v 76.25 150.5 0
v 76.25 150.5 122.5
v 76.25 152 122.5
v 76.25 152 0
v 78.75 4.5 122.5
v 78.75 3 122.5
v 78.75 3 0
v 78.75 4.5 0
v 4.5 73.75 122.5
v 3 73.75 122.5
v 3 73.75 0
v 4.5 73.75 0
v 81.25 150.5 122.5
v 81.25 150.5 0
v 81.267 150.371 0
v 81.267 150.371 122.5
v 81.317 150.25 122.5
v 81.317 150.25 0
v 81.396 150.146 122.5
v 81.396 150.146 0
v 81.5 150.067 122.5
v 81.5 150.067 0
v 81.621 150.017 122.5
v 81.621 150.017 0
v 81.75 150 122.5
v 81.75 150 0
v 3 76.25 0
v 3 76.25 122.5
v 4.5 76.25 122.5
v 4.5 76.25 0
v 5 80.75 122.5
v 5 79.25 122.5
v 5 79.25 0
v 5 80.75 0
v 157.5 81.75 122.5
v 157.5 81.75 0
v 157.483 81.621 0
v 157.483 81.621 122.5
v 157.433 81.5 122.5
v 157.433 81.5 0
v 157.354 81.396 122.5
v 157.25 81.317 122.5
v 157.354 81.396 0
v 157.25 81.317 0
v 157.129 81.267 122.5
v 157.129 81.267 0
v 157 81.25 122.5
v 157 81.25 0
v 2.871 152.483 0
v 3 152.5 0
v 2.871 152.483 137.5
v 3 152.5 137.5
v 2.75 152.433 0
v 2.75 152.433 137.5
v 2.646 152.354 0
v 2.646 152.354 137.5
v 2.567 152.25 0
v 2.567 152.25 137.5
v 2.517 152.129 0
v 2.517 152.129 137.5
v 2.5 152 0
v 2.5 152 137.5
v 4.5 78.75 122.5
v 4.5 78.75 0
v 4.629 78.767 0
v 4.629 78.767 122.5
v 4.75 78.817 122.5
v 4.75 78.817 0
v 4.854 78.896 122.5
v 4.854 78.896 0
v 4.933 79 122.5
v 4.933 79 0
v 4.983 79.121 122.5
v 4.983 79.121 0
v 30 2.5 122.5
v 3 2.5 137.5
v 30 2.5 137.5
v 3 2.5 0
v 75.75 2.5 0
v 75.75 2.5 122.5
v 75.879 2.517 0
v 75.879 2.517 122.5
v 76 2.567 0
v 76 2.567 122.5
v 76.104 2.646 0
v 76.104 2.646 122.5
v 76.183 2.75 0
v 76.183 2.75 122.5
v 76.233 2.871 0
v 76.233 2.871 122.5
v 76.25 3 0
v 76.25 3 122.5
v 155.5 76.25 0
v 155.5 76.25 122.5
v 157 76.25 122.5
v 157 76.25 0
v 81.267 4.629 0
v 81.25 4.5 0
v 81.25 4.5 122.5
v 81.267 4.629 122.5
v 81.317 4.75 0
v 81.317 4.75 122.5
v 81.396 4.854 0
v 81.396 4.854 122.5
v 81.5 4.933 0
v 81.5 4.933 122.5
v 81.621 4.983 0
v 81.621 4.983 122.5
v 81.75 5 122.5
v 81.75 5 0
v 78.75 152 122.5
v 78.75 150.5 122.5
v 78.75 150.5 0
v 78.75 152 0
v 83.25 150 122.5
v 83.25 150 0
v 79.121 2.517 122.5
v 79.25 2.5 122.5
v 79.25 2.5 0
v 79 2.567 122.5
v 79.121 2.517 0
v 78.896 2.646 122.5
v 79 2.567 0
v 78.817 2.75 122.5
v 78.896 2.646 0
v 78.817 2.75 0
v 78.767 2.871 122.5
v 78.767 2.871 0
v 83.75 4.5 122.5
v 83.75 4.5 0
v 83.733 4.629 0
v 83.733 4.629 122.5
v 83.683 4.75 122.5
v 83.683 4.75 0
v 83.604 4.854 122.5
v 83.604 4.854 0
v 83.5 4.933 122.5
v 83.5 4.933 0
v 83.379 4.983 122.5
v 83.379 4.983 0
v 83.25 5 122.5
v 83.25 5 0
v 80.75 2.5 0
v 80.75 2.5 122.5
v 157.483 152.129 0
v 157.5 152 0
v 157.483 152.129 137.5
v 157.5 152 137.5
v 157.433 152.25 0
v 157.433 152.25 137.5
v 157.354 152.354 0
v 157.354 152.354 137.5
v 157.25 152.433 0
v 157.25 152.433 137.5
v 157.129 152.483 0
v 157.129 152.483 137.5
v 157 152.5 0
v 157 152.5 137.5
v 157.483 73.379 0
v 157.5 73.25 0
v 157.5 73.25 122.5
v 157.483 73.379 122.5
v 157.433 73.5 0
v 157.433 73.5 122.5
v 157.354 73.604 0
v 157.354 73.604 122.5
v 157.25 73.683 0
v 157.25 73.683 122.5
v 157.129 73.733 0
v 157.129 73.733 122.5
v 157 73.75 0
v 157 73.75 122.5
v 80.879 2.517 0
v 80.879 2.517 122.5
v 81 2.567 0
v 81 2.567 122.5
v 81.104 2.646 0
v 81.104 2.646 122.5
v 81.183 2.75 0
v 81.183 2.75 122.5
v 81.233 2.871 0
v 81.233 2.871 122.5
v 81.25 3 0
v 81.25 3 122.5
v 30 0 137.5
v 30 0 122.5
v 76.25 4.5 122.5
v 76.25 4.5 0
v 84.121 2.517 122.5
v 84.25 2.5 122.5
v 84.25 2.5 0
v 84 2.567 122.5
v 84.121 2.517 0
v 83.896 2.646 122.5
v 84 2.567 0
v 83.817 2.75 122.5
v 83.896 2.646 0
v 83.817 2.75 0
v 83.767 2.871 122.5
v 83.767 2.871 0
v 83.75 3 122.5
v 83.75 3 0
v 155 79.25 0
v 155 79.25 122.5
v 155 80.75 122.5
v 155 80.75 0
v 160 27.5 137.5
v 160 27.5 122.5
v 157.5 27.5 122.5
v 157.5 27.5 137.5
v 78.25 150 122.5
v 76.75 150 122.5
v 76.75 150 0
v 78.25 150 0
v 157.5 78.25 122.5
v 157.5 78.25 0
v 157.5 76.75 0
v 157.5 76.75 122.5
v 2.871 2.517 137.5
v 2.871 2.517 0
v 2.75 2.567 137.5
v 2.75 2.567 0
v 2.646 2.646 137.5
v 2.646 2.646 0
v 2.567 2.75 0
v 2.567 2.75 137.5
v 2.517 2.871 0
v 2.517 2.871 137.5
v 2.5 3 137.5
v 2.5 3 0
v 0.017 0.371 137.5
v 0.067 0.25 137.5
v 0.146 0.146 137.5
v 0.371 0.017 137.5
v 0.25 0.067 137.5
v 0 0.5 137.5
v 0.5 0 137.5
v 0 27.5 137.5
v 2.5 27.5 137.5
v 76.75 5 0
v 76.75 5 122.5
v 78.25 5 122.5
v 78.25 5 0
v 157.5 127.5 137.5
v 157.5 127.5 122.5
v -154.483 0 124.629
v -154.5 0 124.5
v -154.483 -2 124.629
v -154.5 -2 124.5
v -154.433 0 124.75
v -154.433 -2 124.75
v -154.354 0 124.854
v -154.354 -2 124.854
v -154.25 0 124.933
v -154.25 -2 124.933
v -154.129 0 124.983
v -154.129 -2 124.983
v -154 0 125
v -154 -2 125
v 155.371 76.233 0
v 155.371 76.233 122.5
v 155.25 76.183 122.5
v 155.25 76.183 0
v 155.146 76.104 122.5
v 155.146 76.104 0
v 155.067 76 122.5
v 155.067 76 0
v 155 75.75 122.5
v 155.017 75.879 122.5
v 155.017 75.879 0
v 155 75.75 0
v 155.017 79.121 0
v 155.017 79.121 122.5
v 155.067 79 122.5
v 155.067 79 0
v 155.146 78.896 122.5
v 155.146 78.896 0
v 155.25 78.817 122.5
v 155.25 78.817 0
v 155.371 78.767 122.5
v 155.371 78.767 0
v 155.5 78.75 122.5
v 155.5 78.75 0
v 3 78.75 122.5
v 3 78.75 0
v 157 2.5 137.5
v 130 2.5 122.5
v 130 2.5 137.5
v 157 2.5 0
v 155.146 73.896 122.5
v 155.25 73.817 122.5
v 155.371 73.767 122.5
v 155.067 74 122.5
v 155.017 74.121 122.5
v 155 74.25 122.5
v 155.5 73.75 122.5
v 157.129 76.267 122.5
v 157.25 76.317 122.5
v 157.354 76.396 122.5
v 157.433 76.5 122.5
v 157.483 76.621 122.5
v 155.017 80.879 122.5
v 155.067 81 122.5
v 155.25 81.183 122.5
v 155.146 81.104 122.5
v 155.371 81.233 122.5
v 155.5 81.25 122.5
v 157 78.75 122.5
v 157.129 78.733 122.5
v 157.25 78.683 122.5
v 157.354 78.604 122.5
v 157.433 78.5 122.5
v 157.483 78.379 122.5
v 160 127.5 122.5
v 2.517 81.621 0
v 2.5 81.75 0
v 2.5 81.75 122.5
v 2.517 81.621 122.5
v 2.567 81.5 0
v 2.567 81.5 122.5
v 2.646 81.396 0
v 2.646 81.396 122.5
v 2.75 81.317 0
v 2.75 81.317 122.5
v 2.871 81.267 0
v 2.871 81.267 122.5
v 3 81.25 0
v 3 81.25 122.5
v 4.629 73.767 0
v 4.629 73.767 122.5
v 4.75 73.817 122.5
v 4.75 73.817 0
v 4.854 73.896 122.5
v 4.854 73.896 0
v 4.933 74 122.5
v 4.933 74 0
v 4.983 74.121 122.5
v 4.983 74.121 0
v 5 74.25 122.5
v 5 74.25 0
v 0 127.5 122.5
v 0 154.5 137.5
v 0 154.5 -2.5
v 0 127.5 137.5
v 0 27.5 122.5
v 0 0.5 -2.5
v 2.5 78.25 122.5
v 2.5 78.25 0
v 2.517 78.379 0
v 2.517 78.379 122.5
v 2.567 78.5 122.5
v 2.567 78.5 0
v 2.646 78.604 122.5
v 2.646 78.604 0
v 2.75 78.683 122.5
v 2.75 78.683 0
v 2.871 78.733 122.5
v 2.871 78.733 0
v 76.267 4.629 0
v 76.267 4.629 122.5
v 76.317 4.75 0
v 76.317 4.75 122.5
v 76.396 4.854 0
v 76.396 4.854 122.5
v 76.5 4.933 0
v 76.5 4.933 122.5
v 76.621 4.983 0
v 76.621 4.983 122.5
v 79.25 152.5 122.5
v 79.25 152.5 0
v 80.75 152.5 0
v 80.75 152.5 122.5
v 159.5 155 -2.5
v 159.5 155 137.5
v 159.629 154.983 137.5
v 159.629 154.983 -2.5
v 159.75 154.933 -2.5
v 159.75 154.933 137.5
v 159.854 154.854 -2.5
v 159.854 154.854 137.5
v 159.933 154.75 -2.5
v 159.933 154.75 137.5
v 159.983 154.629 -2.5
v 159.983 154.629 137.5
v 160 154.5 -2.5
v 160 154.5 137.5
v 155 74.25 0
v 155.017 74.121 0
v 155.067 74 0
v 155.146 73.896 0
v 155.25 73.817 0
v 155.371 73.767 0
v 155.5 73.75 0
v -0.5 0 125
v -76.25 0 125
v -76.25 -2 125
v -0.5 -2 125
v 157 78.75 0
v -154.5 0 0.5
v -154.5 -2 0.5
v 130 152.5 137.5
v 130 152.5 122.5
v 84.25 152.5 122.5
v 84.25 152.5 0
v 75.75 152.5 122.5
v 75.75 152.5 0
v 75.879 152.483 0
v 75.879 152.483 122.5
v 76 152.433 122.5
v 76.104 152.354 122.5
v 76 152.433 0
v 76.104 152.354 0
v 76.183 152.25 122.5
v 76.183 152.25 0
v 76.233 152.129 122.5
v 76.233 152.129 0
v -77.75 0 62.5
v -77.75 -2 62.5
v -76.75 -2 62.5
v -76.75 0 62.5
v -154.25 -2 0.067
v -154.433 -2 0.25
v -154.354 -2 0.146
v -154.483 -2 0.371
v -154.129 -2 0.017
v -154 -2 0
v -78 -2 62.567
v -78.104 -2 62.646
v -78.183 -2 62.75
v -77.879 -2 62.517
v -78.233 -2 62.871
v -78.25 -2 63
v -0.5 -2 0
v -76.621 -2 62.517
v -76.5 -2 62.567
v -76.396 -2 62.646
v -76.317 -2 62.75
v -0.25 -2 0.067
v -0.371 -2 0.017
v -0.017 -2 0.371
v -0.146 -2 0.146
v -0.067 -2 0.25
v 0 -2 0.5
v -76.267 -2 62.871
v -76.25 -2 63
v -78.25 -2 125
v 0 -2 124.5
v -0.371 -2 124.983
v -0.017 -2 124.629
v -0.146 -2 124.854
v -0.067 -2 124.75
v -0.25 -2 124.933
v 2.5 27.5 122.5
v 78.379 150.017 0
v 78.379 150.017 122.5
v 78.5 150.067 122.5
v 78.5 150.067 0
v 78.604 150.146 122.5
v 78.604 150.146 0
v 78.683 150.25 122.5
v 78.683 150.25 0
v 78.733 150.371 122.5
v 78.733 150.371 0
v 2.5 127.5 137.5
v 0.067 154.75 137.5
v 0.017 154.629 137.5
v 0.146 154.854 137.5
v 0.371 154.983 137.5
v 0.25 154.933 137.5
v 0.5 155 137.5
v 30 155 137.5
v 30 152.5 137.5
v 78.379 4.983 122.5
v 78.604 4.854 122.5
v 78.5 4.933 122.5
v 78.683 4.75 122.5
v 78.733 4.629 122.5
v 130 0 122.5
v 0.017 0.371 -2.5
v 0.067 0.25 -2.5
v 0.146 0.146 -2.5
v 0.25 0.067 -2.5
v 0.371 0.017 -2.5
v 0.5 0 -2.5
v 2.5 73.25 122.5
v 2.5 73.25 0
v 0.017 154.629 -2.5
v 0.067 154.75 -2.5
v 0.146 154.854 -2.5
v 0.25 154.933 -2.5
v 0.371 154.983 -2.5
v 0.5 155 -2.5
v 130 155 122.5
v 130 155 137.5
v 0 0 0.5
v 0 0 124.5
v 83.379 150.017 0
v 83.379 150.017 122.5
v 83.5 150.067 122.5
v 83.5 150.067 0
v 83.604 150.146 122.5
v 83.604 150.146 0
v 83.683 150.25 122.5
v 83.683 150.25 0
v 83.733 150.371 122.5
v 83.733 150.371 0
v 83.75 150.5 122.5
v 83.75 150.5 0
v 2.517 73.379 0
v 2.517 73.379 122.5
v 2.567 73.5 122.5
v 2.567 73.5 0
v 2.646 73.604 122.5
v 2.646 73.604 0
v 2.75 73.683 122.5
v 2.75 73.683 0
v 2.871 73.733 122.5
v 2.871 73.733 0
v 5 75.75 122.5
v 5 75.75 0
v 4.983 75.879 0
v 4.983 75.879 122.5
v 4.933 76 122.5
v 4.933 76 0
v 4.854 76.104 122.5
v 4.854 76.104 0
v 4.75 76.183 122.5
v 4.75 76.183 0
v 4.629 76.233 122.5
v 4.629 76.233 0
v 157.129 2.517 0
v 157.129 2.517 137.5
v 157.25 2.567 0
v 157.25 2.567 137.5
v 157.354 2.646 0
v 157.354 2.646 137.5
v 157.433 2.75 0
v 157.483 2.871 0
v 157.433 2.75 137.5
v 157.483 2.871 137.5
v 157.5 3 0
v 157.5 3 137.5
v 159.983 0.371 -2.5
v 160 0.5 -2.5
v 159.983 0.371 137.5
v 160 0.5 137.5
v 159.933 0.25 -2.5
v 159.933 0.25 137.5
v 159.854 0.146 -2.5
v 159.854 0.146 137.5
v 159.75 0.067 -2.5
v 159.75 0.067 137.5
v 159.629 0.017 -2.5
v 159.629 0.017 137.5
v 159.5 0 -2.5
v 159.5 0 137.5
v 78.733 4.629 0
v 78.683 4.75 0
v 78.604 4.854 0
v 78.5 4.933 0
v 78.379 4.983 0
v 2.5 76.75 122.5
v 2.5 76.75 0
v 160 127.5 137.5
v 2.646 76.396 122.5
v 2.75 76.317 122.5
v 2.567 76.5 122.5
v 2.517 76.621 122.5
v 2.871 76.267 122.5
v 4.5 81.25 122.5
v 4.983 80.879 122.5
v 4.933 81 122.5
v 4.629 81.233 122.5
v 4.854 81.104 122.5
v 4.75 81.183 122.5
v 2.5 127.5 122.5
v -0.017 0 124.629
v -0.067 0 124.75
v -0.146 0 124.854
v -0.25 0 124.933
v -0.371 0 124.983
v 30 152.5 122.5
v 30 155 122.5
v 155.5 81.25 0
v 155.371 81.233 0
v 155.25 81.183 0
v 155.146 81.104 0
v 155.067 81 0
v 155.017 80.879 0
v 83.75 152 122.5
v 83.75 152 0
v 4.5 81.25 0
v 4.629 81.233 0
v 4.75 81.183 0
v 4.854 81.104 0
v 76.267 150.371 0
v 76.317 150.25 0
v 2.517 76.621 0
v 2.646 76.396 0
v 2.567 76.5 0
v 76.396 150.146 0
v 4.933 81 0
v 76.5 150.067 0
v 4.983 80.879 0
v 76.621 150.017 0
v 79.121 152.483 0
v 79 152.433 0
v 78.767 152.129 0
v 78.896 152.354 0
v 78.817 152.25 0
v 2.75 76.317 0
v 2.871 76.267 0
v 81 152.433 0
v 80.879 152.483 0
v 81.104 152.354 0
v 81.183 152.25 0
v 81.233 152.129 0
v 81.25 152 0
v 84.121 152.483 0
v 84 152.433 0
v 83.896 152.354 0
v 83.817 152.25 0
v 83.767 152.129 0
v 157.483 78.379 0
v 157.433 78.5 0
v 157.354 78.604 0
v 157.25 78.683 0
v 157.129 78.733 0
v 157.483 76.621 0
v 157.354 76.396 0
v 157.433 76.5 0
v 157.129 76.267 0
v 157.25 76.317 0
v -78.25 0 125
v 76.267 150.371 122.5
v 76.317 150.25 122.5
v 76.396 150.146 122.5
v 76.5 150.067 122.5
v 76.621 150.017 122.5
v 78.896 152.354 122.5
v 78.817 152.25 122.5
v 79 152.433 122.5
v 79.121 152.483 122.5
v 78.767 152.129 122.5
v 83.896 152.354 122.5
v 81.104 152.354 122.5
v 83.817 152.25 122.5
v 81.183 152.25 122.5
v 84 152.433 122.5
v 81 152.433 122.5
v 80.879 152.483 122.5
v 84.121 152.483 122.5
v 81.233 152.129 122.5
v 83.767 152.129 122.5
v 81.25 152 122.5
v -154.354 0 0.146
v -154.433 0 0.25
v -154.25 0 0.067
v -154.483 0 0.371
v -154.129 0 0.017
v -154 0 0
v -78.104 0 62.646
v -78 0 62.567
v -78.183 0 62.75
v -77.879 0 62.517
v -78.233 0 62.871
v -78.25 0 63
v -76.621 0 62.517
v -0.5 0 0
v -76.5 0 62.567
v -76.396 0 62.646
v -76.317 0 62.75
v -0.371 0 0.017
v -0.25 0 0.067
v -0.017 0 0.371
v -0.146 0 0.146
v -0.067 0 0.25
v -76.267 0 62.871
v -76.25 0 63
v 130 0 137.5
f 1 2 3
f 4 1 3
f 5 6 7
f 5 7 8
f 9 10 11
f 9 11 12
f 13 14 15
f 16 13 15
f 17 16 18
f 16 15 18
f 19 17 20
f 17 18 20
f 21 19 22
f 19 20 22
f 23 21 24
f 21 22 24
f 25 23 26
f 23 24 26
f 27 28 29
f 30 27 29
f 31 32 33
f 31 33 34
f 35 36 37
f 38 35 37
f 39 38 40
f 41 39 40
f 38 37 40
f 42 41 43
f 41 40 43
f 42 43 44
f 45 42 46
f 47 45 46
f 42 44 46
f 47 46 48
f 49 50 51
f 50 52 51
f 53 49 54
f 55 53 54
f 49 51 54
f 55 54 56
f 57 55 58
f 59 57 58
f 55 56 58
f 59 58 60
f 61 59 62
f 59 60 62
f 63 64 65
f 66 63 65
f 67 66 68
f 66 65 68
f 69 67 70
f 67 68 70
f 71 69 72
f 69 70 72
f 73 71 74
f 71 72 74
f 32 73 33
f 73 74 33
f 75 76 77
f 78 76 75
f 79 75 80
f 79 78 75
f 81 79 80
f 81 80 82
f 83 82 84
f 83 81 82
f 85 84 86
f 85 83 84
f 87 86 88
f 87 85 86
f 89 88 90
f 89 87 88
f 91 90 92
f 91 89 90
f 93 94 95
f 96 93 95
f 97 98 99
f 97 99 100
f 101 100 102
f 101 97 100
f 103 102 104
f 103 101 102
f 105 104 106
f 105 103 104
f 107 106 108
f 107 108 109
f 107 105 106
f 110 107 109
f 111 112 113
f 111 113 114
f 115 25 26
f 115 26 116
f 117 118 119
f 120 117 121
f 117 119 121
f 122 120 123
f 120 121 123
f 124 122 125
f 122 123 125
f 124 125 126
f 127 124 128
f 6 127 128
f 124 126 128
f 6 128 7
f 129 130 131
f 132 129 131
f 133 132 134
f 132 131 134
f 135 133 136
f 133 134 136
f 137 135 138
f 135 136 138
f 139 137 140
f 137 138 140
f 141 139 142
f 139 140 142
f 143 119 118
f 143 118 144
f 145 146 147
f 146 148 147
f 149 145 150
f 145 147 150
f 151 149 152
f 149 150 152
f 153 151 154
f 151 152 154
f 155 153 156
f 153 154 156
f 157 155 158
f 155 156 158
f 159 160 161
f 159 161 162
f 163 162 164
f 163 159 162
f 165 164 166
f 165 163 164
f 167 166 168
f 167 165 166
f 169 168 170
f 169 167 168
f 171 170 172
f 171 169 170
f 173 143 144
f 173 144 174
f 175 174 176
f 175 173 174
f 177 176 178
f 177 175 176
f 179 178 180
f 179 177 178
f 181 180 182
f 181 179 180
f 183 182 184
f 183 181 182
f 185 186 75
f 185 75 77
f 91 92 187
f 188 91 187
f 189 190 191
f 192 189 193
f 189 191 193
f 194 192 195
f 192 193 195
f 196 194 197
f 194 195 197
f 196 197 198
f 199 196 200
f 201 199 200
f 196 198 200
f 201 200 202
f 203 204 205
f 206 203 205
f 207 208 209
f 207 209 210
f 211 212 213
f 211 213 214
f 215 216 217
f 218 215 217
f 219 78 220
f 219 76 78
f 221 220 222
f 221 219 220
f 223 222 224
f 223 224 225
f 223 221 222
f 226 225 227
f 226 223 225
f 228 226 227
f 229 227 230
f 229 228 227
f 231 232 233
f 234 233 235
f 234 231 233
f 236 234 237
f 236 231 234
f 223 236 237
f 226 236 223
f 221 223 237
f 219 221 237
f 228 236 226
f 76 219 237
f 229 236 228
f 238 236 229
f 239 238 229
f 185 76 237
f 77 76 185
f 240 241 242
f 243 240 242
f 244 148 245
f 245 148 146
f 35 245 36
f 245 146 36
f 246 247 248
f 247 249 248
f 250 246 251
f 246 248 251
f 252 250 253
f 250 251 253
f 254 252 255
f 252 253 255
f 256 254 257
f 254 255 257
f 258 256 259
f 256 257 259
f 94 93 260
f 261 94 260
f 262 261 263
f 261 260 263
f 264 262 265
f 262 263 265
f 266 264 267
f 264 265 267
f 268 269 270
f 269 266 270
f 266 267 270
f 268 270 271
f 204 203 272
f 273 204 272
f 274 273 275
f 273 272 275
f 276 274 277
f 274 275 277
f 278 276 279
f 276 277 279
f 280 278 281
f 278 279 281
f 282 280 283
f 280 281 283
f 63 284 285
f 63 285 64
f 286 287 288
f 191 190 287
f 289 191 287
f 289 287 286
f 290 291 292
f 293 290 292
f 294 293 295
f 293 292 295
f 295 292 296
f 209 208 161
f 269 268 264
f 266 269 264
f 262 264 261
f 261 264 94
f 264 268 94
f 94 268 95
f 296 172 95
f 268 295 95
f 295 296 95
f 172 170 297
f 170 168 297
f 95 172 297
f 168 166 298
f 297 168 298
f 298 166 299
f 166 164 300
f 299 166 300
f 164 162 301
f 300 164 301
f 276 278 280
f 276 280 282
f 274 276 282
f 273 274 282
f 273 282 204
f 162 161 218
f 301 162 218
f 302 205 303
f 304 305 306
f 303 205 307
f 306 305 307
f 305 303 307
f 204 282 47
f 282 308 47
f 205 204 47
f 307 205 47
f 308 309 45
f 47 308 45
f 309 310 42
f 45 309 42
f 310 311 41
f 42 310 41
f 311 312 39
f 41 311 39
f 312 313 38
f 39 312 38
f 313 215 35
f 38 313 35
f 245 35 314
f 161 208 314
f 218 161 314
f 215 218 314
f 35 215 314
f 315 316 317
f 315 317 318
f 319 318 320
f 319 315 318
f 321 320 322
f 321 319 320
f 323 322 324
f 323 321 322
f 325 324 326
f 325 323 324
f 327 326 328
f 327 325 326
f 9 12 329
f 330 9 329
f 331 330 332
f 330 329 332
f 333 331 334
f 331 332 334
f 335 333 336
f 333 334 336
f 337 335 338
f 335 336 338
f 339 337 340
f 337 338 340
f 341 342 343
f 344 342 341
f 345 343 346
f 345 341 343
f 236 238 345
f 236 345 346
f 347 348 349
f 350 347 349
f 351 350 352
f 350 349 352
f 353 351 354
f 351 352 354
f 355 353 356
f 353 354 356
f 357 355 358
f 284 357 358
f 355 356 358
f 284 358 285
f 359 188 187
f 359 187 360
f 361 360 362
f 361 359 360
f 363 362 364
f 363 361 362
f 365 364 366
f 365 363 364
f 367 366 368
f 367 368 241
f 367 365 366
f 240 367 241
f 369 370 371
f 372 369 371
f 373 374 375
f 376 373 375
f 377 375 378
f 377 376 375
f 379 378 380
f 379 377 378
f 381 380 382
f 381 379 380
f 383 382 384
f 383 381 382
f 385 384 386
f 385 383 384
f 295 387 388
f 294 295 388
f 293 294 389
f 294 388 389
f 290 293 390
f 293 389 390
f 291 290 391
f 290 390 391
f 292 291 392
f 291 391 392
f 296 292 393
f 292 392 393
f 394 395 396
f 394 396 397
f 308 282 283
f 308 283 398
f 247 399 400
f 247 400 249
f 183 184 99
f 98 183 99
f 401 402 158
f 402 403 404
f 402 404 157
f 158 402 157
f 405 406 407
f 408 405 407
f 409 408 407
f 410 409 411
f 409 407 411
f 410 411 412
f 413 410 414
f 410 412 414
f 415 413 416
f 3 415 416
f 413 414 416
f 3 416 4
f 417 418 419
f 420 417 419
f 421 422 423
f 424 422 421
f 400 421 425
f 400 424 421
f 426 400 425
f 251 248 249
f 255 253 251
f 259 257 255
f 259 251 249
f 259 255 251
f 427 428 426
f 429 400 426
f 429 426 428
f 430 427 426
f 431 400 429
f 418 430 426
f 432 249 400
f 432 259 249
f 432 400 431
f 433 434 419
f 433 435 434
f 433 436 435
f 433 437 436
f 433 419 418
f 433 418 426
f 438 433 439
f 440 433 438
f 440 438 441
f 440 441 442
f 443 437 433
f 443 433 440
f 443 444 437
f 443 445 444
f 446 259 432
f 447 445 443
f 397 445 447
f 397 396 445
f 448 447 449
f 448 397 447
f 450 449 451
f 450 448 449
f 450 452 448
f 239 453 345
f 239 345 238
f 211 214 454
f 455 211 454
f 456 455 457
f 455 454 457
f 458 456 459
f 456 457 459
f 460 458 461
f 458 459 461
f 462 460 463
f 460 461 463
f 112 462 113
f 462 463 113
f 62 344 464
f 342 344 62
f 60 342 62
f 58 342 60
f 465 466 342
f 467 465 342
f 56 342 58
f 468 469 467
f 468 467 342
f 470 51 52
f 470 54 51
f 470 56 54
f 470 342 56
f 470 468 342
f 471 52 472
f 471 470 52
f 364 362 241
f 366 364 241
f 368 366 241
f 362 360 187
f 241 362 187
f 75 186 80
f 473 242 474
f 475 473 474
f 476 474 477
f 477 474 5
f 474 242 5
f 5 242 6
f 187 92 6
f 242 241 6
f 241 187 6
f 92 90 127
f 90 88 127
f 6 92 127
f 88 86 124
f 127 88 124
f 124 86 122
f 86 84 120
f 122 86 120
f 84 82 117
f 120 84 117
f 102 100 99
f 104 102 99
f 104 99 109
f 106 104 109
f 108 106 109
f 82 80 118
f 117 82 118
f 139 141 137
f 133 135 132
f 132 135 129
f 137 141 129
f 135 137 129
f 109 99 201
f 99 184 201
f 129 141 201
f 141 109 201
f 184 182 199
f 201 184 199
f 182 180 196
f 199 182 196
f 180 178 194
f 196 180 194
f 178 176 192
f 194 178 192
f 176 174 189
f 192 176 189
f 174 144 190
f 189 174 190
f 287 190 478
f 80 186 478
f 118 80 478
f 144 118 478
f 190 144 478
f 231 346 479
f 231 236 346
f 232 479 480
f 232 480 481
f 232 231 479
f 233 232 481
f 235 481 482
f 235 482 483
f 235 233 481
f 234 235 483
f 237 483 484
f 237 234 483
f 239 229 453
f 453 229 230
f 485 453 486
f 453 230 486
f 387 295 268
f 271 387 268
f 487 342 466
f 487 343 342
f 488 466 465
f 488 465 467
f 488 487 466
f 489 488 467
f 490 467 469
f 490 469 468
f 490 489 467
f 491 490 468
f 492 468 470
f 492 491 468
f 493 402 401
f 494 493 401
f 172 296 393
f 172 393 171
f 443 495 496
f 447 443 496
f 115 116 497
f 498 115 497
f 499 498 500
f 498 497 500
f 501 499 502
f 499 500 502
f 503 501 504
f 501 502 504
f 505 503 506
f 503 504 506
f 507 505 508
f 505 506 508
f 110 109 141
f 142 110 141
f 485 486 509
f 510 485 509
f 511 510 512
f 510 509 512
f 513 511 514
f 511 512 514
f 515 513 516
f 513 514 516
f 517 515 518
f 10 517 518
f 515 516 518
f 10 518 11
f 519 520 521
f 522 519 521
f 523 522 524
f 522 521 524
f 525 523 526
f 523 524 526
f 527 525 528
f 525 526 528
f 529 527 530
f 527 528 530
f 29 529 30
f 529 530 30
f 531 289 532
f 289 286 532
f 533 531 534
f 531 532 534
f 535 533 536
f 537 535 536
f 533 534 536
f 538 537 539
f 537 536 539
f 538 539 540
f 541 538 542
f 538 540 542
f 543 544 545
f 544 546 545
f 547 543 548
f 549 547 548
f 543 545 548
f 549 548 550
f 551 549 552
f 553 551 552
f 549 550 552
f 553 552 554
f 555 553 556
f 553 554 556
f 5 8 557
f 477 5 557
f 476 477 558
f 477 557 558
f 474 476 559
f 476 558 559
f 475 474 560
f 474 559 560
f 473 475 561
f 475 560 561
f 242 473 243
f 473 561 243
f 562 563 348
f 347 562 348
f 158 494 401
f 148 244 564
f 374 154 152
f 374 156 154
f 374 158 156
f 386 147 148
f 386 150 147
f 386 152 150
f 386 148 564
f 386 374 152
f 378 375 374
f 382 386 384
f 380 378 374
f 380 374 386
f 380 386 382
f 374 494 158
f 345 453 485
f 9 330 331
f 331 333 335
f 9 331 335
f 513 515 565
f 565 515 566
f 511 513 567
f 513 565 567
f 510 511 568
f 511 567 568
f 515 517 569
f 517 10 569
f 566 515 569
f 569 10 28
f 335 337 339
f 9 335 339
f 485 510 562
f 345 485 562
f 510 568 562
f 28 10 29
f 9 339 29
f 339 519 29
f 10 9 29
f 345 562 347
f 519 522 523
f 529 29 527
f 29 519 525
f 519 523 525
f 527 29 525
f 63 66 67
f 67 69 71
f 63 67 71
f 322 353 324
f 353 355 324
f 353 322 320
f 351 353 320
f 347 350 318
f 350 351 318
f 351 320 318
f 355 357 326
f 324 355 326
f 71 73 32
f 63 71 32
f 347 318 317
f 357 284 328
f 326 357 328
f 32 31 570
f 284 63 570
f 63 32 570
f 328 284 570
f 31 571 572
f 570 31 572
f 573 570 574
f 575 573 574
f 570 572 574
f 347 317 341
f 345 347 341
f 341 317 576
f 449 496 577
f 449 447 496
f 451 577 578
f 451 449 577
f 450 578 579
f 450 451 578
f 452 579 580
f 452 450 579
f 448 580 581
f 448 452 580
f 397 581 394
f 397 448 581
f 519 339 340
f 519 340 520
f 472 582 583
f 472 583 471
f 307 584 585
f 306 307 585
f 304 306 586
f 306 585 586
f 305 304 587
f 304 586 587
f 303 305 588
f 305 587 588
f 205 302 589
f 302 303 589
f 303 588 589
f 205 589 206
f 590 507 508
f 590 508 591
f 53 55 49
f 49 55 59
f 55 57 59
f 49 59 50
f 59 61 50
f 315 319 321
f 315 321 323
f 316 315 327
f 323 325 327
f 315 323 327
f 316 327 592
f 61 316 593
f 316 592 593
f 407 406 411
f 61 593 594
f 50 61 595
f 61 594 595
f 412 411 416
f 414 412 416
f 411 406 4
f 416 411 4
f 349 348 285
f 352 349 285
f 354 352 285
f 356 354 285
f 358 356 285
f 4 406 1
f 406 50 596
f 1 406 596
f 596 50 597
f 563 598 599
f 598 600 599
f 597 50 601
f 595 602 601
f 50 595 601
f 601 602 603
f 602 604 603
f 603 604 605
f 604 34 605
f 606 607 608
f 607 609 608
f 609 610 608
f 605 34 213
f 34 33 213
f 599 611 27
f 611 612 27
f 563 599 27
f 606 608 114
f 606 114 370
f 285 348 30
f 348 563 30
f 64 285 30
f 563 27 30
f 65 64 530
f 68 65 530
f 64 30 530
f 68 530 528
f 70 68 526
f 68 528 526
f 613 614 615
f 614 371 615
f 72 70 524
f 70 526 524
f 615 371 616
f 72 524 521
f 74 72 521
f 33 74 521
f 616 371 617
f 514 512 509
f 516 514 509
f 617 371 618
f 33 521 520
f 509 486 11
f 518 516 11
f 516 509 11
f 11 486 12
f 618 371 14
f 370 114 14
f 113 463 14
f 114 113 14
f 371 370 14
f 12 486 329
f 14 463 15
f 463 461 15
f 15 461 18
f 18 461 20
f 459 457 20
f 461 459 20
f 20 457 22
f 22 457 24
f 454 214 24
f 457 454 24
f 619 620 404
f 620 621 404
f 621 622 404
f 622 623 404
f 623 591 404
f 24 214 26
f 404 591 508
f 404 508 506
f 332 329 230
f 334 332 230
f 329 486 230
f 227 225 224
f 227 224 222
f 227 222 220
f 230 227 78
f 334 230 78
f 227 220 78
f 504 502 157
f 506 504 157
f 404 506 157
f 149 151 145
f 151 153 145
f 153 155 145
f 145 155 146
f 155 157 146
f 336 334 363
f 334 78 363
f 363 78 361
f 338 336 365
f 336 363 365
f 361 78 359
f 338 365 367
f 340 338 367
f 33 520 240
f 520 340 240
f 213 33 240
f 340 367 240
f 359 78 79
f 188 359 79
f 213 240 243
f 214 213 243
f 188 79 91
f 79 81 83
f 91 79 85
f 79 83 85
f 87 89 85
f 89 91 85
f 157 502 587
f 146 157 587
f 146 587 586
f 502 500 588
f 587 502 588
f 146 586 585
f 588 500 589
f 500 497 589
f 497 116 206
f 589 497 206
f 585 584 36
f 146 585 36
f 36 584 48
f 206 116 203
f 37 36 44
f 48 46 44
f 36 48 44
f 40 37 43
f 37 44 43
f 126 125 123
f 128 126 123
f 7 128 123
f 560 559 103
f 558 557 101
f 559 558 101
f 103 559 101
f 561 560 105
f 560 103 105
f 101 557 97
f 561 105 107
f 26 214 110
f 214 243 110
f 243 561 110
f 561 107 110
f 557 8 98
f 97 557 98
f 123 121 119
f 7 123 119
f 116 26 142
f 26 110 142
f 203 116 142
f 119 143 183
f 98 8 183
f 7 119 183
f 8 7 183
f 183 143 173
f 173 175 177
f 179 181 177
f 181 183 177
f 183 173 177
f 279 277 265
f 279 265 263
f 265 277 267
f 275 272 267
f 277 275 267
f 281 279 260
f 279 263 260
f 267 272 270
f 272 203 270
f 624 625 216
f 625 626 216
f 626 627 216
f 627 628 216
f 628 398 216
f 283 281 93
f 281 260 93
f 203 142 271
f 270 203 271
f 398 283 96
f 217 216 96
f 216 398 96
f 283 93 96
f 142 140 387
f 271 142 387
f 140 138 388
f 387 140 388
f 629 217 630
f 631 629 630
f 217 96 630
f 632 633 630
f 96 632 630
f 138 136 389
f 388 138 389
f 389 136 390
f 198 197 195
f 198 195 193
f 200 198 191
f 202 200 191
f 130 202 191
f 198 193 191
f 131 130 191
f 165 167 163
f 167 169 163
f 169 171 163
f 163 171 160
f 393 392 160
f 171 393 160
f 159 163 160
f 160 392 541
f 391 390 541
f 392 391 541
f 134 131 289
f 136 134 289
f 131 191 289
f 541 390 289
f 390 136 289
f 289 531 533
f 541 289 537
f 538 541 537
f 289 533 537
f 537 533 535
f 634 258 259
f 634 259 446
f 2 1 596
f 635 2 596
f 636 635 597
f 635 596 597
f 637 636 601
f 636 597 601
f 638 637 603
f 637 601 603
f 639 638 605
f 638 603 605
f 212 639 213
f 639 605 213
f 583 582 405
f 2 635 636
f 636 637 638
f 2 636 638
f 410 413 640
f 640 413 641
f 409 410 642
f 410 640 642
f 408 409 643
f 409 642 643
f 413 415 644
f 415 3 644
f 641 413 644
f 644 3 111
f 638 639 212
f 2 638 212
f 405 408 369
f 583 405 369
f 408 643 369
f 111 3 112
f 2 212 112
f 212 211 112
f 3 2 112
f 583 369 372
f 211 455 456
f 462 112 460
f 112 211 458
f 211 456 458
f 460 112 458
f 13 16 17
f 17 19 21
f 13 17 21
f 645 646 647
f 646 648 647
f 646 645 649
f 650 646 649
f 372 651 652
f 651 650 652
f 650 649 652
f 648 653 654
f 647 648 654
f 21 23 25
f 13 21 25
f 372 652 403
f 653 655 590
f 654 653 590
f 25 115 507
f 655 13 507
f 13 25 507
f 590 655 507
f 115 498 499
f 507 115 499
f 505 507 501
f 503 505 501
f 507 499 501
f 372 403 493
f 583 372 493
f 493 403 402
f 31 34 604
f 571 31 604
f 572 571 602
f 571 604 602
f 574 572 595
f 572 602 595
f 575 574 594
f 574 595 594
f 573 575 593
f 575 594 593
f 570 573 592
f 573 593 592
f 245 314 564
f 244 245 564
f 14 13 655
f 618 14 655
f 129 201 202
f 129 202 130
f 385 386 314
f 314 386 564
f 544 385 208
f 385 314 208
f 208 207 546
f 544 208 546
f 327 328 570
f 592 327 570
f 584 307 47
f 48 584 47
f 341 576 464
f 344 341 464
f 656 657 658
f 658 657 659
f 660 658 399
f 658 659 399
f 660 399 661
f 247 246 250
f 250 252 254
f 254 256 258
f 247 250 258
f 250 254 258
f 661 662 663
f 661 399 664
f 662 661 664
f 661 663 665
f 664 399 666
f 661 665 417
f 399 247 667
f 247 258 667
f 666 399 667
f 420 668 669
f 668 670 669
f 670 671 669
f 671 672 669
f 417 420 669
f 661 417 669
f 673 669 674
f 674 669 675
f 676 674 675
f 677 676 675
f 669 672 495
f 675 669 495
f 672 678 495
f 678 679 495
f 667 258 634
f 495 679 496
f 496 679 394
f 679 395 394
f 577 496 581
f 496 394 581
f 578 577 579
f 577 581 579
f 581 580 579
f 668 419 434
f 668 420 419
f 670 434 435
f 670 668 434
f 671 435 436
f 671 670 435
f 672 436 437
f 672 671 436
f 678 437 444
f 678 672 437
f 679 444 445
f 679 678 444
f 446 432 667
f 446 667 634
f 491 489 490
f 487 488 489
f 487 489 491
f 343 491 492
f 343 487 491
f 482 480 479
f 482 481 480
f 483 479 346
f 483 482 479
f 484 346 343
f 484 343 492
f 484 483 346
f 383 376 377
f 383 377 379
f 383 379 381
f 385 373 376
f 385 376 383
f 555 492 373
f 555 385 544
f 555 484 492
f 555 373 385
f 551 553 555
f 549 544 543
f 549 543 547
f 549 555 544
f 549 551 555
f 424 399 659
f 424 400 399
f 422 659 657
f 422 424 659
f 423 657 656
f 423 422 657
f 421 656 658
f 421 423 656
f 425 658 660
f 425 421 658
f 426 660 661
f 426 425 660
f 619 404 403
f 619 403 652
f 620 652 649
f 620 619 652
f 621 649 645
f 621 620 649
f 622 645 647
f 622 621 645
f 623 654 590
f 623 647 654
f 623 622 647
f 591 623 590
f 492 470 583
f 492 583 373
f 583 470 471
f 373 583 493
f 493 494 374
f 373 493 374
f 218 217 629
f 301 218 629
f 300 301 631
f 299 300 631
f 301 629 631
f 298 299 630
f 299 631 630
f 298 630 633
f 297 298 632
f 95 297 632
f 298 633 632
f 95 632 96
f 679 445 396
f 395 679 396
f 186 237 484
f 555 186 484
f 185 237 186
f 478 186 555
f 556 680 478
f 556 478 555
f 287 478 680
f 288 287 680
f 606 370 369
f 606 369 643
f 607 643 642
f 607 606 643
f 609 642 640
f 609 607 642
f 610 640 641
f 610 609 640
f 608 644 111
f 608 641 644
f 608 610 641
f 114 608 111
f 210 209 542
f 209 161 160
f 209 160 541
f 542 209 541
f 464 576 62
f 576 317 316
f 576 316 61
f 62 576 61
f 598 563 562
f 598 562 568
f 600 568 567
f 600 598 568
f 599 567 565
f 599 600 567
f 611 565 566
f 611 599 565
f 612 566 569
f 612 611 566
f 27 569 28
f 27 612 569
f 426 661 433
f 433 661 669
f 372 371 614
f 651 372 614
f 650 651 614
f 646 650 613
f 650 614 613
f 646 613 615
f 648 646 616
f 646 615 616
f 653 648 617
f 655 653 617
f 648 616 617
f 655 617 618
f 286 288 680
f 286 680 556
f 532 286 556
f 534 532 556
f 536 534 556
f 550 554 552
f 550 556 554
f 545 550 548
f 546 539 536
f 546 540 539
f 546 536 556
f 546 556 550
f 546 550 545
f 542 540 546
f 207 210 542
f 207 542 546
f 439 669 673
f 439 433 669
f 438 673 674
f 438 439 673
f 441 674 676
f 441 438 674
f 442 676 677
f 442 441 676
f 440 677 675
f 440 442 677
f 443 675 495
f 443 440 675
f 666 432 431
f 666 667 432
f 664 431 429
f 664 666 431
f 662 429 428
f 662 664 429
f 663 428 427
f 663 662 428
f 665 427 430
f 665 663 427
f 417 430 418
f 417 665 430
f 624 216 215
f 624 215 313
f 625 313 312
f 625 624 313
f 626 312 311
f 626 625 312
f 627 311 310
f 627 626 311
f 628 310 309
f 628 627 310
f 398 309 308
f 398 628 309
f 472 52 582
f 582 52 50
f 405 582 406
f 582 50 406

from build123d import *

# Parameters (mm, degrees)
F0_W      = 155
F0_H      = 2.5
F1_DEPTH  = 137.5
F2_W      = 160
F2_H      = 155
F2_W_2    = 155
F2_H_2    = 150
F3_DEPTH  = 2.5
F4_R      = 0.5
F5_W      = 2.5
F5_H      = 2.5
F6_DEPTH  = 137.5
F7_R      = 0.5
F8_W      = 154.5
F8_H      = 125
F9_DEPTH  = 2
F10_R     = 0.5
F12_ANGLE = 90
F15_W     = 2
F15_H     = 62.5
F16_DEPTH = 157.001
F17_R     = 0.5
F18_W     = 100
F18_H     = 15
F19_DEPTH = 155.001
F20_W     = 100
F20_H     = 15
F21_DEPTH = 314.501


with BuildPart() as f1:
    # F0 (on Top) → F1 (new body)
    with BuildSketch(Plane.XY):
        Polygon((0, 155), (0, 0), (2.5, 0), (2.5, 2.5), (2.5, 152.5), (157.5, 152.5), (157.5, 2.5), (157.5, 0), (160, 0), (160, 155), align=None)
        with Locations((80, 1.25)):
            Rectangle(F0_W, F0_H)
    extrude(amount=F1_DEPTH)

    # F2 (on face) → F3 (join)
    with BuildSketch(Plane(origin=(0, 0, 0), x_dir=(1, 0, 0), z_dir=(0, 0, -1))):
        with Locations((80, -77.5)):
            Rectangle(F2_W, F2_H)
        with Locations((80, -77.5)):
            Rectangle(F2_W_2, F2_H_2, mode=Mode.SUBTRACT)
        with Locations((80, -77.5)):
            Rectangle(F2_W_2, F2_H_2)
    extrude(amount=F3_DEPTH)

    # F4
    f4_edges = [f1.edges().sort_by_distance(p)[0] for p in [
        (0, 155, 67.5),
        (160, 155, 67.5),
        (160, 0, 67.5),
        (0, 0, 67.5),
        (2.5, 152.5, 68.75),
        (157.5, 152.5, 68.75),
        (157.5, 2.5, 68.75),
        (2.5, 2.5, 68.75),
    ]]
    fillet(f4_edges, radius=F4_R)

    # F5 (on face) → F6 (join, through all)
    with BuildSketch(Plane.XY.offset(137.5)):
        with Locations((3.75, 80)):
            Rectangle(F5_W, F5_H)
        with Locations((3.75, 75)):
            Rectangle(F5_W, F5_H)
        with Locations((77.5, 3.75)):
            Rectangle(F5_W, F5_H)
        with Locations((82.5, 3.75)):
            Rectangle(F5_W, F5_H)
        with Locations((156.25, 80)):
            Rectangle(F5_W, F5_H)
        with Locations((156.25, 75)):
            Rectangle(F5_W, F5_H)
        with Locations((82.5, 151.25)):
            Rectangle(F5_W, F5_H)
        with Locations((77.5, 151.25)):
            Rectangle(F5_W, F5_H)
    extrude(amount=-F6_DEPTH)

    # F7
    f7_edges = [f1.edges().sort_by_distance(p)[0] for p in [
        (5, 81.25, 68.75),
        (5, 78.75, 68.75),
        (2.5, 78.75, 68.75),
        (2.5, 76.25, 68.75),
        (5, 76.25, 68.75),
        (5, 73.75, 68.75),
        (2.5, 73.75, 68.75),
        (2.5, 81.25, 68.75),
        (76.25, 150, 68.75),
        (78.75, 150, 68.75),
        (78.75, 152.5, 68.75),
        (81.25, 152.5, 68.75),
        (81.25, 150, 68.75),
        (83.75, 150, 68.75),
        (83.75, 152.5, 68.75),
        (76.25, 152.5, 68.75),
        (157.5, 73.75, 68.75),
        (155, 73.75, 68.75),
        (155, 76.25, 68.75),
        (157.5, 81.25, 68.75),
        (155, 81.25, 68.75),
        (155, 78.75, 68.75),
        (157.5, 78.75, 68.75),
        (157.5, 76.25, 68.75),
        (76.25, 2.5, 68.75),
        (76.25, 5, 68.75),
        (78.75, 5, 68.75),
        (78.75, 2.5, 68.75),
        (81.25, 5, 68.75),
        (81.25, 2.5, 68.75),
        (83.75, 2.5, 68.75),
        (83.75, 5, 68.75),
    ]]
    fillet(f7_edges, radius=F7_R)

    # F18 (on face) → F19 (cut, through all)
    with BuildSketch(Plane.XZ):
        with Locations((80, 130)):
            Rectangle(F18_W, F18_H)
    extrude(amount=-F19_DEPTH, mode=Mode.SUBTRACT)

    # F20 (on face) → F21 (cut, through all)
    with BuildSketch(Plane.YZ.offset(160)):
        with Locations((77.5, 130)):
            Rectangle(F20_W, F20_H)
    extrude(amount=-F21_DEPTH, mode=Mode.SUBTRACT)


with BuildPart() as f9:
    # F8 (on Front) → F9 (new body)
    with BuildSketch(Plane.XZ):
        with Locations((-77.25, 62.5)):
            Rectangle(F8_W, F8_H)
    extrude(amount=F9_DEPTH)

    # F10
    f10_edges = [f9.edges().sort_by_distance(p)[0] for p in [
        (0, -1, 0),
        (0, -1, 125),
        (-154.5, -1, 125),
        (-154.5, -1, 0),
    ]]
    fillet(f10_edges, radius=F10_R)


with BuildPart() as f11_1:
    # F11: copy of F9
    add(f9.part)


with BuildPart() as f12_1:
    # F12: copy of F9
    add(f9.part.rotate(Axis((0, 154.5, 67.5), (0, 0, 1)), F12_ANGLE))


with BuildPart() as f9_1:
    add(f9.part)

    # F15 (on face) → F16 (cut, through all)
    with BuildSketch(Plane.XZ.offset(2)):
        with Locations((-77.25, 93.75)):
            Rectangle(F15_W, F15_H)
    extrude(amount=-F16_DEPTH, mode=Mode.SUBTRACT)

    # F17
    f17_edges = [f9_1.edges().sort_by_distance(p)[0] for p in [
        (-78.25, -1, 62.5),
        (-76.25, -1, 62.5),
    ]]
    fillet(f17_edges, radius=F17_R)


solid = Compound([f1.part, f9_1.part])
